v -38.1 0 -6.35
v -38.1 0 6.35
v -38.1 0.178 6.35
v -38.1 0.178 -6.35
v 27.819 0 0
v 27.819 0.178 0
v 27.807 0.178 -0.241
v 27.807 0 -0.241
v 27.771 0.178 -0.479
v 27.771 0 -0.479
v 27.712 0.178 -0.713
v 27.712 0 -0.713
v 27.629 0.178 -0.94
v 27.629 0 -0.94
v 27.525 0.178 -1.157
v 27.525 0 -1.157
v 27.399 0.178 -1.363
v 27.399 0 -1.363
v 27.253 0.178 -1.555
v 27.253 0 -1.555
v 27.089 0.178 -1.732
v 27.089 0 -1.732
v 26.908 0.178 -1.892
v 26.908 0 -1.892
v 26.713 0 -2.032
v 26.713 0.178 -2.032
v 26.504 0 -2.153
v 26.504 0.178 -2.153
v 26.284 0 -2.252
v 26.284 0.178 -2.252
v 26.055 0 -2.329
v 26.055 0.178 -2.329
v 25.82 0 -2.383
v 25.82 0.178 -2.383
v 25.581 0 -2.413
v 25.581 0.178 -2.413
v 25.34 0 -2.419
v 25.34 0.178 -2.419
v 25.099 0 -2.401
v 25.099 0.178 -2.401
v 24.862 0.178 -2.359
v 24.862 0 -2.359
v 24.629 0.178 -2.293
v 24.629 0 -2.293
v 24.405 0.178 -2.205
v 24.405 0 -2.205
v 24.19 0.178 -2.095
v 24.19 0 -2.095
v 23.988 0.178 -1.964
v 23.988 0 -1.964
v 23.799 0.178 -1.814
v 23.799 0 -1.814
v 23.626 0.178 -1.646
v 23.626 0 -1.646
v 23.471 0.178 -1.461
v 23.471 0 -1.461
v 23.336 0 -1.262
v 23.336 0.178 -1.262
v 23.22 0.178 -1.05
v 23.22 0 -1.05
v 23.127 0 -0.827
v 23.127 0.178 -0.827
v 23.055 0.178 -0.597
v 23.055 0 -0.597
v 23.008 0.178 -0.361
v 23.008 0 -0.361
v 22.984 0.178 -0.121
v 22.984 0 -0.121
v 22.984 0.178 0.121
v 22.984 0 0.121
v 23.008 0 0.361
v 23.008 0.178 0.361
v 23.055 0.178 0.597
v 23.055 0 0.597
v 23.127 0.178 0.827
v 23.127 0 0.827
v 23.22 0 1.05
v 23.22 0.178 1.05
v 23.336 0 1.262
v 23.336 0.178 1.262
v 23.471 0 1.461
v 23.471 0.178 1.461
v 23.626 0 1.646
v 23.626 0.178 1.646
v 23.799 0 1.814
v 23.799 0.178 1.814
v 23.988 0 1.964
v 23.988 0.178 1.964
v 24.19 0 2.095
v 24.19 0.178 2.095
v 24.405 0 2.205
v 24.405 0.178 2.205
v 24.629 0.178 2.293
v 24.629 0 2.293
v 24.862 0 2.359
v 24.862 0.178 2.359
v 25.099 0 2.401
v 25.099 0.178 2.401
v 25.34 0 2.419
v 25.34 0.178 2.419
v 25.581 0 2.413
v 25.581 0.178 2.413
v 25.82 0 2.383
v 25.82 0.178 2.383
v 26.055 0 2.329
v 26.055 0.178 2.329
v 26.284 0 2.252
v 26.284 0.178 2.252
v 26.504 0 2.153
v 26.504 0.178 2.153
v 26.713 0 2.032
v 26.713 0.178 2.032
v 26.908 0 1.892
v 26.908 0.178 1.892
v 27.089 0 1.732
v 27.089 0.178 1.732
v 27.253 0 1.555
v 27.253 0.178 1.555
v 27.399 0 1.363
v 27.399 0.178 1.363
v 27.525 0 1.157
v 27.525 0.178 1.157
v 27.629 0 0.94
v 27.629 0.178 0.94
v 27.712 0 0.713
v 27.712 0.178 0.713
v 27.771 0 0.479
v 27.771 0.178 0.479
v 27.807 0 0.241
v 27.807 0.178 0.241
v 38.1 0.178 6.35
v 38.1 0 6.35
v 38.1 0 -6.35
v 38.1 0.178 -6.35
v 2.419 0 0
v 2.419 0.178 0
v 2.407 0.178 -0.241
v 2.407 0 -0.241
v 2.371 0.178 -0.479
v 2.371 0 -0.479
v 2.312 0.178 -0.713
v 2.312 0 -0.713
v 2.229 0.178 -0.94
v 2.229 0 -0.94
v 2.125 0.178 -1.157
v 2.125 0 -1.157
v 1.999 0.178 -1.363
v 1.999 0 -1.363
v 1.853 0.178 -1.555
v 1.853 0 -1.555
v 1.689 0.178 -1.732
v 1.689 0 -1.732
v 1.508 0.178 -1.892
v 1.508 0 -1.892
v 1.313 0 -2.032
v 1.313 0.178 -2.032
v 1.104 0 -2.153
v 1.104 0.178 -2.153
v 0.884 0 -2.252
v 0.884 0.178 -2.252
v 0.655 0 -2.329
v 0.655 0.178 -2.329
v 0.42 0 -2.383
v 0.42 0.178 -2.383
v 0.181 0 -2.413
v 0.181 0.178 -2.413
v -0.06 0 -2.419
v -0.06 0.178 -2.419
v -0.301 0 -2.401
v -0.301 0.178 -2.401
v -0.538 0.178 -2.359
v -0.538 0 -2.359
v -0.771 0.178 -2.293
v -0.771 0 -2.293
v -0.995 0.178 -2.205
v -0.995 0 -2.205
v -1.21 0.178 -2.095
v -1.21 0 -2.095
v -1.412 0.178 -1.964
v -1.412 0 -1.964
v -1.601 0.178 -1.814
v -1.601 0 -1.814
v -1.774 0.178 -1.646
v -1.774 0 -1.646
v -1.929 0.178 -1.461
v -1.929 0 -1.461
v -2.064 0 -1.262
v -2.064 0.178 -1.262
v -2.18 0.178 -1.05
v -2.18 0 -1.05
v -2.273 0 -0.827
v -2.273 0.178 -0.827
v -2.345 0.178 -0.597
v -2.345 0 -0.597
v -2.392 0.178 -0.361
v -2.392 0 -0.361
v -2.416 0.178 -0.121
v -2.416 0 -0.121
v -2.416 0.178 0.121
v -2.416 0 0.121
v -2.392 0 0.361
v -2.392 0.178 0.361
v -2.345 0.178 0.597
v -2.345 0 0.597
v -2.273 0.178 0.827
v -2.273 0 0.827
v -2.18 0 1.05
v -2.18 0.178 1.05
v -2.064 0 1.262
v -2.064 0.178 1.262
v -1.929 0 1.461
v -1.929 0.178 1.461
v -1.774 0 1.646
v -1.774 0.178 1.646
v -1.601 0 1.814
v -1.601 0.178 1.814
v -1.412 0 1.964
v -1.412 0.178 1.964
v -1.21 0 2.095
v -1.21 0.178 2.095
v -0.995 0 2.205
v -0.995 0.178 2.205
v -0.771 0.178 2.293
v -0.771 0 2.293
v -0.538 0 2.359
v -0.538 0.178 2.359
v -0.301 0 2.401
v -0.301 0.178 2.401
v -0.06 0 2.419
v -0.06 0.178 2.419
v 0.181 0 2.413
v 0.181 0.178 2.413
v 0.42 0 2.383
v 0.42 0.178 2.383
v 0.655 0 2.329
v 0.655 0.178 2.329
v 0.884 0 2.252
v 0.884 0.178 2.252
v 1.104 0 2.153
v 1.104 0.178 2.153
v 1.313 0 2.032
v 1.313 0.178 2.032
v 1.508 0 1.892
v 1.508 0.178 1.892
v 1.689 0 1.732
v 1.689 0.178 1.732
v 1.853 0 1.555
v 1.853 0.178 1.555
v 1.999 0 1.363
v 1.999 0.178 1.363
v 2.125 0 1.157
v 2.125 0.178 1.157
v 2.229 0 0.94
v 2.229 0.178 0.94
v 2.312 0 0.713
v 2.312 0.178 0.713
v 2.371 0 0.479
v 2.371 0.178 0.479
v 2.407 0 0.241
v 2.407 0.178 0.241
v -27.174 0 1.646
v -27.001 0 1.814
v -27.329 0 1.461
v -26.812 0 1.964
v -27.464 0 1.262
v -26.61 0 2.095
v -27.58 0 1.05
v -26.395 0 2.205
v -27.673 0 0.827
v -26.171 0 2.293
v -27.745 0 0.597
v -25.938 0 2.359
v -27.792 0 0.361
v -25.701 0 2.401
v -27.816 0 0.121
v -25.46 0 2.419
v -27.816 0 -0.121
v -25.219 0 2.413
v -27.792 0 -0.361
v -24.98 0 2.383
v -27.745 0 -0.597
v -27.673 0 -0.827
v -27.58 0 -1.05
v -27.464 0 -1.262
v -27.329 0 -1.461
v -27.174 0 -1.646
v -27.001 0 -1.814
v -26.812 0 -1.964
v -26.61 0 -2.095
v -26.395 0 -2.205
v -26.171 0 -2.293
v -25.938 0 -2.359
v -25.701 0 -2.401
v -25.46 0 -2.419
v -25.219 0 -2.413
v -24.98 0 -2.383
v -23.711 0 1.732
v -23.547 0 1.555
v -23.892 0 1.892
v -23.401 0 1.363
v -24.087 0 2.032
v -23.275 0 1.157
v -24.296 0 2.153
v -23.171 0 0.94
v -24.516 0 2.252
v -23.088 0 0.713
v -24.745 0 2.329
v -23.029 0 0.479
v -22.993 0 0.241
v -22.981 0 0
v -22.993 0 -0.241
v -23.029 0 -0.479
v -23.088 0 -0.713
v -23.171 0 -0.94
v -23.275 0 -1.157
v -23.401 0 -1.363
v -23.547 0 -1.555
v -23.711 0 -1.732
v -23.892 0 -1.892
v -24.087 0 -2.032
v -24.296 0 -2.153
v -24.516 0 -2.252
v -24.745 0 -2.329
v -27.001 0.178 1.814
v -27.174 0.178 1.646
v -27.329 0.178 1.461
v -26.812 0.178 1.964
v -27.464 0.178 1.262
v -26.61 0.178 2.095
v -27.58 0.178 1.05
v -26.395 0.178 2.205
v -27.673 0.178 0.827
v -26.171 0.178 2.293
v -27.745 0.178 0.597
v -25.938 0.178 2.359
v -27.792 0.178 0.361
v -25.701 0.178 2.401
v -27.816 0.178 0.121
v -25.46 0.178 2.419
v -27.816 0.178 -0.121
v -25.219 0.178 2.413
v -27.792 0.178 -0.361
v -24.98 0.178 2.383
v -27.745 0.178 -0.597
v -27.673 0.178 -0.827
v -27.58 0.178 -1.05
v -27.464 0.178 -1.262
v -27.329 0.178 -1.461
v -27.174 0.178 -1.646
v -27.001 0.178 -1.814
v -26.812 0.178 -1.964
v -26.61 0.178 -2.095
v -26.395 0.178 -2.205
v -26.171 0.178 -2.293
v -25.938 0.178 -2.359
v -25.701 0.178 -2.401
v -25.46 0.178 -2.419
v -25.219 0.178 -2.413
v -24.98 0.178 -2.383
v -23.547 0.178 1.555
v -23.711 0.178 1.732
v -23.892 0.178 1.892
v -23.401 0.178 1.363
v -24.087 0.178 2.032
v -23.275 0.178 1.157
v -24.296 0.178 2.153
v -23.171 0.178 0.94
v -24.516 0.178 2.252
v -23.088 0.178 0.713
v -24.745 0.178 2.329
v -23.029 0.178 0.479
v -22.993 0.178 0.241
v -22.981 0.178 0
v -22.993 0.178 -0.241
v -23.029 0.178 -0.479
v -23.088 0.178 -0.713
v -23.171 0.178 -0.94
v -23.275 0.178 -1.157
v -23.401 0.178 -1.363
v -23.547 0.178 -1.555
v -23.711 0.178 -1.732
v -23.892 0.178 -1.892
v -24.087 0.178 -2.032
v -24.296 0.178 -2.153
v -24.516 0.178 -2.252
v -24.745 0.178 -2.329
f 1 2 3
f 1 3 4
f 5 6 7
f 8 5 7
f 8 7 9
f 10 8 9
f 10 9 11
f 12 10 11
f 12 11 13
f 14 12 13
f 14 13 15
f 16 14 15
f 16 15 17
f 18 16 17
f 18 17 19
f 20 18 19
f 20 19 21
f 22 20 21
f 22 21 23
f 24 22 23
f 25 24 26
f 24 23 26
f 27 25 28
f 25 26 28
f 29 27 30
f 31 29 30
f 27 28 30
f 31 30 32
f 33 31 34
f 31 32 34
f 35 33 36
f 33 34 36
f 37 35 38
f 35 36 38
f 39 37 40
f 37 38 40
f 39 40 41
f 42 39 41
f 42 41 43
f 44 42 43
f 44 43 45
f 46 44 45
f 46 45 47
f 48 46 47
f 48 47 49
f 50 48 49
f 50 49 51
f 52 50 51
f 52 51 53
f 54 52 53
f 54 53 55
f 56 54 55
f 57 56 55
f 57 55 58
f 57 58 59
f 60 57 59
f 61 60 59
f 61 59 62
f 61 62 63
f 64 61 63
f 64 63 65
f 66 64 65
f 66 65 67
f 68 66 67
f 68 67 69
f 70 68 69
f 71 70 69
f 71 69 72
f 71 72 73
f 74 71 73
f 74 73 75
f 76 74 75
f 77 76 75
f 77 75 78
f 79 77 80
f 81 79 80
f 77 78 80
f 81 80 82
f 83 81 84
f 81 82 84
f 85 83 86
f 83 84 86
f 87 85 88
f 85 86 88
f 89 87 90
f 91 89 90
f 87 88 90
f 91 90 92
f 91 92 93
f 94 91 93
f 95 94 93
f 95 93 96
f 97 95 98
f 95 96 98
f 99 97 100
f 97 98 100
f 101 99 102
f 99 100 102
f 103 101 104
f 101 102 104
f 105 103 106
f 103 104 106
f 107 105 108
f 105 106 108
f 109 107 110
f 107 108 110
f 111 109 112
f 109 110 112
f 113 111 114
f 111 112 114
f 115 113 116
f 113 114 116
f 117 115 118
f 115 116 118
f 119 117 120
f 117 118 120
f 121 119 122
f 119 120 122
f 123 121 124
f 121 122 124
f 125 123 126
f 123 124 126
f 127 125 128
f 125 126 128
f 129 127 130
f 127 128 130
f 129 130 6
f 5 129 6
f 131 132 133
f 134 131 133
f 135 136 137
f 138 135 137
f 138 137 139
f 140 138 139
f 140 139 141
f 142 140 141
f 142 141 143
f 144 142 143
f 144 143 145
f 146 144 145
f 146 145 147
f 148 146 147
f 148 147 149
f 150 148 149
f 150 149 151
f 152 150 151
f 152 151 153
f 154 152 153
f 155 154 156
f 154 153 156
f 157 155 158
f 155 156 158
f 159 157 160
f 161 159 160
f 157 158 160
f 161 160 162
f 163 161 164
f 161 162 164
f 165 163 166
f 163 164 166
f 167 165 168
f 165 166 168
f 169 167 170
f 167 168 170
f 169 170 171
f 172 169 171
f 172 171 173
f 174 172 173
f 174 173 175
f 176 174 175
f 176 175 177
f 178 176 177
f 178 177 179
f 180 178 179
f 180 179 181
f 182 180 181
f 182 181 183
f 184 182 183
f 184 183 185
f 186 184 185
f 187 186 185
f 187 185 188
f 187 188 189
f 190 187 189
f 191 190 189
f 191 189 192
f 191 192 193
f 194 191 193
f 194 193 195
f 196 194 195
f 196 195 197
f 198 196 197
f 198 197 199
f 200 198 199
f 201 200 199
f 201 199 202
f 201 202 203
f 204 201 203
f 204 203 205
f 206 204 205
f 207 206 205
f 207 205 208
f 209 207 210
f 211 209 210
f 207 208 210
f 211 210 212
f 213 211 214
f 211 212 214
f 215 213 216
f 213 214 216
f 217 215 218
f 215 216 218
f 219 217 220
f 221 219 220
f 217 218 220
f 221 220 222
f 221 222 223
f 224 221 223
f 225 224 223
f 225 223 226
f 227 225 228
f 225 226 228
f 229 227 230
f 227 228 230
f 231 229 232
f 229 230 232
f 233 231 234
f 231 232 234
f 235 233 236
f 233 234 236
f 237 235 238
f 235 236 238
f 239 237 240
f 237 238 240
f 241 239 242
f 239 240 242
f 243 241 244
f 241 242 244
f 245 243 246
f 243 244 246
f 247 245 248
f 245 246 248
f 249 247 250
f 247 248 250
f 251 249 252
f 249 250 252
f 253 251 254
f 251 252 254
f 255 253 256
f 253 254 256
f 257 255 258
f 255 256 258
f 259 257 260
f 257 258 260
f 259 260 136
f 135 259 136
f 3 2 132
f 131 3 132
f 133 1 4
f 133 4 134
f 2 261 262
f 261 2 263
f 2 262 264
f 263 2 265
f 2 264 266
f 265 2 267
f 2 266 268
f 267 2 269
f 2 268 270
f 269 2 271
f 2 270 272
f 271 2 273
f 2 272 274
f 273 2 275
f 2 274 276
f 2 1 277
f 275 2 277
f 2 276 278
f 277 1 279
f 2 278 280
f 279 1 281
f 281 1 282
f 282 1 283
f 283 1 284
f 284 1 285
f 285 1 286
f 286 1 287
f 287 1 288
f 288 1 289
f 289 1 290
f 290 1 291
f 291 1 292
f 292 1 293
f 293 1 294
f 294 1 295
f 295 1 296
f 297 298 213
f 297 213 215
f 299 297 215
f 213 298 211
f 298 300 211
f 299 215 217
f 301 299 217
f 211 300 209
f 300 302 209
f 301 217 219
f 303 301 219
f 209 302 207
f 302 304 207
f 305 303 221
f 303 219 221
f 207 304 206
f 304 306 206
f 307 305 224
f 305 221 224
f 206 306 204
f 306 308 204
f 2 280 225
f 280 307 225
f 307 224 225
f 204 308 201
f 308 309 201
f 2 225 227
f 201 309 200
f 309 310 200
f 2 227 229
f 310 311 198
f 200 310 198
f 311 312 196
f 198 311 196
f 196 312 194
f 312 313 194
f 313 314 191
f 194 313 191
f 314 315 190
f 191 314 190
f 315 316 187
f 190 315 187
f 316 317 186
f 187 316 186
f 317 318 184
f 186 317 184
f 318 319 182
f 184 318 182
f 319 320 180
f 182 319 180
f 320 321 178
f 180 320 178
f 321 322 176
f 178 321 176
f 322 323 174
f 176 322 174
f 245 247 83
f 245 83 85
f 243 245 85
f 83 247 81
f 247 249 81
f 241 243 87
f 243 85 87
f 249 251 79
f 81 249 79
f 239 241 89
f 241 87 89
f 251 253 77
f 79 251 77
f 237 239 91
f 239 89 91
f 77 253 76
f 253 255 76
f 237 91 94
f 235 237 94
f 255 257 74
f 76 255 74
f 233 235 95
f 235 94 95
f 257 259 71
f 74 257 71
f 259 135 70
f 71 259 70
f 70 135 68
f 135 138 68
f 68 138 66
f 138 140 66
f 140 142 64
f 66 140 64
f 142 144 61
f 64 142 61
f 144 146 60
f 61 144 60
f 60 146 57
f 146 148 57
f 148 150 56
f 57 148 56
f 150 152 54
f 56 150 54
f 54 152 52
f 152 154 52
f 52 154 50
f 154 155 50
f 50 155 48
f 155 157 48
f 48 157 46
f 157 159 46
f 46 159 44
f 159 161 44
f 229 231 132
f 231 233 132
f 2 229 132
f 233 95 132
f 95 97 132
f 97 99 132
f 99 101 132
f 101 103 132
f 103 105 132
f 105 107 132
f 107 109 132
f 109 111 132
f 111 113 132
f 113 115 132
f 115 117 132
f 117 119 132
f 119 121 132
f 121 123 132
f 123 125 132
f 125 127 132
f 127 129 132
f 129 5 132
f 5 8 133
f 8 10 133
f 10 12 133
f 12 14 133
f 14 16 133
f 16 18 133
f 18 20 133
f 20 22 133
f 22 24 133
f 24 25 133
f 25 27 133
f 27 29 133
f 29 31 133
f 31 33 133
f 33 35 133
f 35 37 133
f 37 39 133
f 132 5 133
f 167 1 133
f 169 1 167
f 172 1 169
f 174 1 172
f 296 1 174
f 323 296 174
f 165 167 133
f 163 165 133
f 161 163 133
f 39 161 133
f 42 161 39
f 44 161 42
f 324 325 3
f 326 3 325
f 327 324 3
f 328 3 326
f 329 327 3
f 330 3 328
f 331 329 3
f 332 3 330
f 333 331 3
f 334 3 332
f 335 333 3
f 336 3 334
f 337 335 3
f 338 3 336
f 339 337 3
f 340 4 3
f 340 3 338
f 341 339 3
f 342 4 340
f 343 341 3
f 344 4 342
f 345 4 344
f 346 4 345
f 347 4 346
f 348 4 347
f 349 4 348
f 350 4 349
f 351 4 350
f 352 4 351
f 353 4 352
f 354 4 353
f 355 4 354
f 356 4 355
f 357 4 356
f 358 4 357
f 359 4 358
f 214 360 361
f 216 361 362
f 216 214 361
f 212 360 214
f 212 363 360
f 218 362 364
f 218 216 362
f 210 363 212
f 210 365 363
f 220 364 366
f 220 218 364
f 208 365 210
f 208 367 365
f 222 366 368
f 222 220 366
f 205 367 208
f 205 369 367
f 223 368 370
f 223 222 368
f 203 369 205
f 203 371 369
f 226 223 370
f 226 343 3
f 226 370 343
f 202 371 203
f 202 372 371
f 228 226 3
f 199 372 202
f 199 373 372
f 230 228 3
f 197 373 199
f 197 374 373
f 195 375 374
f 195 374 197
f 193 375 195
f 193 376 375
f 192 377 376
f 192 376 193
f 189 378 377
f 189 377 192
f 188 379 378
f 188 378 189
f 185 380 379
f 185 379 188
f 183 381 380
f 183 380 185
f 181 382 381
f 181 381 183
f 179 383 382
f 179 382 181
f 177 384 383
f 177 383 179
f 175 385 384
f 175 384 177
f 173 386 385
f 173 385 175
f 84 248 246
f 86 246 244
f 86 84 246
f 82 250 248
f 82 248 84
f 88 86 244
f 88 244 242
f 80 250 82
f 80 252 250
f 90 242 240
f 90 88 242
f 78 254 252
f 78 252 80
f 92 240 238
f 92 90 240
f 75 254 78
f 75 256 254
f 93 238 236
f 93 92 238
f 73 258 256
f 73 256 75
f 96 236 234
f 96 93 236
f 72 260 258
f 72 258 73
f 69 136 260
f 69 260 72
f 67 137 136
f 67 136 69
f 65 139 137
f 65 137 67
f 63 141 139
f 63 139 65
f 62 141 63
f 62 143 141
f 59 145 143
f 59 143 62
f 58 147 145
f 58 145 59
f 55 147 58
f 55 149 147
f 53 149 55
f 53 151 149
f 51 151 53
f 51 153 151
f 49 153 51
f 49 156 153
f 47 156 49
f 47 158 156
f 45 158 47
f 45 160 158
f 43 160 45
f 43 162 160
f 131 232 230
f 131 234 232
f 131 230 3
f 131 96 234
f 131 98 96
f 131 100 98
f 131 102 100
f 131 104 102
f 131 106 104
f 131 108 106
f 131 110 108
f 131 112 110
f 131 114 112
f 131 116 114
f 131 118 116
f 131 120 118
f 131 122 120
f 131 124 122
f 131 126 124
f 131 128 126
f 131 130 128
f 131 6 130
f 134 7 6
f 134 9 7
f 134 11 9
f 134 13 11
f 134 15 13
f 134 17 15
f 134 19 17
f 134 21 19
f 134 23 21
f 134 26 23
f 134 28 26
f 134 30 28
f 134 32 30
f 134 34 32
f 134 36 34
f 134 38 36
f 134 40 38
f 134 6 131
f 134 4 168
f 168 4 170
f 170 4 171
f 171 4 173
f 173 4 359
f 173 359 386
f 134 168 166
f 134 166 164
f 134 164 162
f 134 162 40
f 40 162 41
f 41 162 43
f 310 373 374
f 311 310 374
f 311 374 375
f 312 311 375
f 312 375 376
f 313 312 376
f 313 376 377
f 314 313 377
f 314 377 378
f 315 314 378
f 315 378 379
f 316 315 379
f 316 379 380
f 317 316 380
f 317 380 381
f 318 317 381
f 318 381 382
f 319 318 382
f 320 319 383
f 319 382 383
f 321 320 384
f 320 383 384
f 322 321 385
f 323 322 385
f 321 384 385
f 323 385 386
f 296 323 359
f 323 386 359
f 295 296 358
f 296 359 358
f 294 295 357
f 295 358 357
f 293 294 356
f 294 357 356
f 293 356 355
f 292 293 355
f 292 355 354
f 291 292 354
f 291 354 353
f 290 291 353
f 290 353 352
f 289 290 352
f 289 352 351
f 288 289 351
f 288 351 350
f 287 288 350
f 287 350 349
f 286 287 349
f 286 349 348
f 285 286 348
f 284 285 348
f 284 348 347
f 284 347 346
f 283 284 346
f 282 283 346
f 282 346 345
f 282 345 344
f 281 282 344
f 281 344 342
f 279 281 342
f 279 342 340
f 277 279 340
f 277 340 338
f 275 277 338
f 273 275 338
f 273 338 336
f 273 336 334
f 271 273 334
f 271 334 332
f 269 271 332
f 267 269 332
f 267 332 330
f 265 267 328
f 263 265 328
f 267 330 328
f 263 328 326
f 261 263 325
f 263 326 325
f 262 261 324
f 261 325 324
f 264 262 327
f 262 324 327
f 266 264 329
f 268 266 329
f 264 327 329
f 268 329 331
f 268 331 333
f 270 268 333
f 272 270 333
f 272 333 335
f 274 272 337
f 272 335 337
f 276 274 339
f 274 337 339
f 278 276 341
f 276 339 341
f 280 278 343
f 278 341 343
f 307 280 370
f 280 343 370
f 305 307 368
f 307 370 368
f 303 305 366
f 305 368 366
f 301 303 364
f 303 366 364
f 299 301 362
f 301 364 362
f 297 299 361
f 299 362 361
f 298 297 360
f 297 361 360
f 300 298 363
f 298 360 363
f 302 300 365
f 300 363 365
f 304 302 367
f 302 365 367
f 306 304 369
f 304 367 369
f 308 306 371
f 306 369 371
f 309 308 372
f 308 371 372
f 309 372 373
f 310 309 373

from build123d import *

# Parameters (mm, degrees)
SKETCH1_W           = 76.2
SKETCH1_H           = 12.7
BOSS_EXTRUDE1_DEPTH = 0.1778
SKETCH2_R           = 2.41935
CUT_EXTRUDE1_DEPTH  = 1.1778


with BuildPart() as part:
    # Sketch1 → Boss-Extrude1 (new body)
    with BuildSketch(Plane(origin=(0, 0, 0), x_dir=(1, 0, 0), z_dir=(0, 1, 0))):
        Rectangle(SKETCH1_W, SKETCH1_H)
    extrude(amount=BOSS_EXTRUDE1_DEPTH)

    # Sketch2 → Cut-Extrude1 (cut, through all)
    with BuildSketch(Plane(origin=(0, 0.1778, 0), x_dir=(1, 0, 0), z_dir=(0, 1, 0))):
        Circle(SKETCH2_R)
        with Locations((-25.4, 0)):
            Circle(SKETCH2_R)
        with Locations((25.4, 0)):
            Circle(SKETCH2_R)
    extrude(amount=-CUT_EXTRUDE1_DEPTH, mode=Mode.SUBTRACT)


solid = part.part
